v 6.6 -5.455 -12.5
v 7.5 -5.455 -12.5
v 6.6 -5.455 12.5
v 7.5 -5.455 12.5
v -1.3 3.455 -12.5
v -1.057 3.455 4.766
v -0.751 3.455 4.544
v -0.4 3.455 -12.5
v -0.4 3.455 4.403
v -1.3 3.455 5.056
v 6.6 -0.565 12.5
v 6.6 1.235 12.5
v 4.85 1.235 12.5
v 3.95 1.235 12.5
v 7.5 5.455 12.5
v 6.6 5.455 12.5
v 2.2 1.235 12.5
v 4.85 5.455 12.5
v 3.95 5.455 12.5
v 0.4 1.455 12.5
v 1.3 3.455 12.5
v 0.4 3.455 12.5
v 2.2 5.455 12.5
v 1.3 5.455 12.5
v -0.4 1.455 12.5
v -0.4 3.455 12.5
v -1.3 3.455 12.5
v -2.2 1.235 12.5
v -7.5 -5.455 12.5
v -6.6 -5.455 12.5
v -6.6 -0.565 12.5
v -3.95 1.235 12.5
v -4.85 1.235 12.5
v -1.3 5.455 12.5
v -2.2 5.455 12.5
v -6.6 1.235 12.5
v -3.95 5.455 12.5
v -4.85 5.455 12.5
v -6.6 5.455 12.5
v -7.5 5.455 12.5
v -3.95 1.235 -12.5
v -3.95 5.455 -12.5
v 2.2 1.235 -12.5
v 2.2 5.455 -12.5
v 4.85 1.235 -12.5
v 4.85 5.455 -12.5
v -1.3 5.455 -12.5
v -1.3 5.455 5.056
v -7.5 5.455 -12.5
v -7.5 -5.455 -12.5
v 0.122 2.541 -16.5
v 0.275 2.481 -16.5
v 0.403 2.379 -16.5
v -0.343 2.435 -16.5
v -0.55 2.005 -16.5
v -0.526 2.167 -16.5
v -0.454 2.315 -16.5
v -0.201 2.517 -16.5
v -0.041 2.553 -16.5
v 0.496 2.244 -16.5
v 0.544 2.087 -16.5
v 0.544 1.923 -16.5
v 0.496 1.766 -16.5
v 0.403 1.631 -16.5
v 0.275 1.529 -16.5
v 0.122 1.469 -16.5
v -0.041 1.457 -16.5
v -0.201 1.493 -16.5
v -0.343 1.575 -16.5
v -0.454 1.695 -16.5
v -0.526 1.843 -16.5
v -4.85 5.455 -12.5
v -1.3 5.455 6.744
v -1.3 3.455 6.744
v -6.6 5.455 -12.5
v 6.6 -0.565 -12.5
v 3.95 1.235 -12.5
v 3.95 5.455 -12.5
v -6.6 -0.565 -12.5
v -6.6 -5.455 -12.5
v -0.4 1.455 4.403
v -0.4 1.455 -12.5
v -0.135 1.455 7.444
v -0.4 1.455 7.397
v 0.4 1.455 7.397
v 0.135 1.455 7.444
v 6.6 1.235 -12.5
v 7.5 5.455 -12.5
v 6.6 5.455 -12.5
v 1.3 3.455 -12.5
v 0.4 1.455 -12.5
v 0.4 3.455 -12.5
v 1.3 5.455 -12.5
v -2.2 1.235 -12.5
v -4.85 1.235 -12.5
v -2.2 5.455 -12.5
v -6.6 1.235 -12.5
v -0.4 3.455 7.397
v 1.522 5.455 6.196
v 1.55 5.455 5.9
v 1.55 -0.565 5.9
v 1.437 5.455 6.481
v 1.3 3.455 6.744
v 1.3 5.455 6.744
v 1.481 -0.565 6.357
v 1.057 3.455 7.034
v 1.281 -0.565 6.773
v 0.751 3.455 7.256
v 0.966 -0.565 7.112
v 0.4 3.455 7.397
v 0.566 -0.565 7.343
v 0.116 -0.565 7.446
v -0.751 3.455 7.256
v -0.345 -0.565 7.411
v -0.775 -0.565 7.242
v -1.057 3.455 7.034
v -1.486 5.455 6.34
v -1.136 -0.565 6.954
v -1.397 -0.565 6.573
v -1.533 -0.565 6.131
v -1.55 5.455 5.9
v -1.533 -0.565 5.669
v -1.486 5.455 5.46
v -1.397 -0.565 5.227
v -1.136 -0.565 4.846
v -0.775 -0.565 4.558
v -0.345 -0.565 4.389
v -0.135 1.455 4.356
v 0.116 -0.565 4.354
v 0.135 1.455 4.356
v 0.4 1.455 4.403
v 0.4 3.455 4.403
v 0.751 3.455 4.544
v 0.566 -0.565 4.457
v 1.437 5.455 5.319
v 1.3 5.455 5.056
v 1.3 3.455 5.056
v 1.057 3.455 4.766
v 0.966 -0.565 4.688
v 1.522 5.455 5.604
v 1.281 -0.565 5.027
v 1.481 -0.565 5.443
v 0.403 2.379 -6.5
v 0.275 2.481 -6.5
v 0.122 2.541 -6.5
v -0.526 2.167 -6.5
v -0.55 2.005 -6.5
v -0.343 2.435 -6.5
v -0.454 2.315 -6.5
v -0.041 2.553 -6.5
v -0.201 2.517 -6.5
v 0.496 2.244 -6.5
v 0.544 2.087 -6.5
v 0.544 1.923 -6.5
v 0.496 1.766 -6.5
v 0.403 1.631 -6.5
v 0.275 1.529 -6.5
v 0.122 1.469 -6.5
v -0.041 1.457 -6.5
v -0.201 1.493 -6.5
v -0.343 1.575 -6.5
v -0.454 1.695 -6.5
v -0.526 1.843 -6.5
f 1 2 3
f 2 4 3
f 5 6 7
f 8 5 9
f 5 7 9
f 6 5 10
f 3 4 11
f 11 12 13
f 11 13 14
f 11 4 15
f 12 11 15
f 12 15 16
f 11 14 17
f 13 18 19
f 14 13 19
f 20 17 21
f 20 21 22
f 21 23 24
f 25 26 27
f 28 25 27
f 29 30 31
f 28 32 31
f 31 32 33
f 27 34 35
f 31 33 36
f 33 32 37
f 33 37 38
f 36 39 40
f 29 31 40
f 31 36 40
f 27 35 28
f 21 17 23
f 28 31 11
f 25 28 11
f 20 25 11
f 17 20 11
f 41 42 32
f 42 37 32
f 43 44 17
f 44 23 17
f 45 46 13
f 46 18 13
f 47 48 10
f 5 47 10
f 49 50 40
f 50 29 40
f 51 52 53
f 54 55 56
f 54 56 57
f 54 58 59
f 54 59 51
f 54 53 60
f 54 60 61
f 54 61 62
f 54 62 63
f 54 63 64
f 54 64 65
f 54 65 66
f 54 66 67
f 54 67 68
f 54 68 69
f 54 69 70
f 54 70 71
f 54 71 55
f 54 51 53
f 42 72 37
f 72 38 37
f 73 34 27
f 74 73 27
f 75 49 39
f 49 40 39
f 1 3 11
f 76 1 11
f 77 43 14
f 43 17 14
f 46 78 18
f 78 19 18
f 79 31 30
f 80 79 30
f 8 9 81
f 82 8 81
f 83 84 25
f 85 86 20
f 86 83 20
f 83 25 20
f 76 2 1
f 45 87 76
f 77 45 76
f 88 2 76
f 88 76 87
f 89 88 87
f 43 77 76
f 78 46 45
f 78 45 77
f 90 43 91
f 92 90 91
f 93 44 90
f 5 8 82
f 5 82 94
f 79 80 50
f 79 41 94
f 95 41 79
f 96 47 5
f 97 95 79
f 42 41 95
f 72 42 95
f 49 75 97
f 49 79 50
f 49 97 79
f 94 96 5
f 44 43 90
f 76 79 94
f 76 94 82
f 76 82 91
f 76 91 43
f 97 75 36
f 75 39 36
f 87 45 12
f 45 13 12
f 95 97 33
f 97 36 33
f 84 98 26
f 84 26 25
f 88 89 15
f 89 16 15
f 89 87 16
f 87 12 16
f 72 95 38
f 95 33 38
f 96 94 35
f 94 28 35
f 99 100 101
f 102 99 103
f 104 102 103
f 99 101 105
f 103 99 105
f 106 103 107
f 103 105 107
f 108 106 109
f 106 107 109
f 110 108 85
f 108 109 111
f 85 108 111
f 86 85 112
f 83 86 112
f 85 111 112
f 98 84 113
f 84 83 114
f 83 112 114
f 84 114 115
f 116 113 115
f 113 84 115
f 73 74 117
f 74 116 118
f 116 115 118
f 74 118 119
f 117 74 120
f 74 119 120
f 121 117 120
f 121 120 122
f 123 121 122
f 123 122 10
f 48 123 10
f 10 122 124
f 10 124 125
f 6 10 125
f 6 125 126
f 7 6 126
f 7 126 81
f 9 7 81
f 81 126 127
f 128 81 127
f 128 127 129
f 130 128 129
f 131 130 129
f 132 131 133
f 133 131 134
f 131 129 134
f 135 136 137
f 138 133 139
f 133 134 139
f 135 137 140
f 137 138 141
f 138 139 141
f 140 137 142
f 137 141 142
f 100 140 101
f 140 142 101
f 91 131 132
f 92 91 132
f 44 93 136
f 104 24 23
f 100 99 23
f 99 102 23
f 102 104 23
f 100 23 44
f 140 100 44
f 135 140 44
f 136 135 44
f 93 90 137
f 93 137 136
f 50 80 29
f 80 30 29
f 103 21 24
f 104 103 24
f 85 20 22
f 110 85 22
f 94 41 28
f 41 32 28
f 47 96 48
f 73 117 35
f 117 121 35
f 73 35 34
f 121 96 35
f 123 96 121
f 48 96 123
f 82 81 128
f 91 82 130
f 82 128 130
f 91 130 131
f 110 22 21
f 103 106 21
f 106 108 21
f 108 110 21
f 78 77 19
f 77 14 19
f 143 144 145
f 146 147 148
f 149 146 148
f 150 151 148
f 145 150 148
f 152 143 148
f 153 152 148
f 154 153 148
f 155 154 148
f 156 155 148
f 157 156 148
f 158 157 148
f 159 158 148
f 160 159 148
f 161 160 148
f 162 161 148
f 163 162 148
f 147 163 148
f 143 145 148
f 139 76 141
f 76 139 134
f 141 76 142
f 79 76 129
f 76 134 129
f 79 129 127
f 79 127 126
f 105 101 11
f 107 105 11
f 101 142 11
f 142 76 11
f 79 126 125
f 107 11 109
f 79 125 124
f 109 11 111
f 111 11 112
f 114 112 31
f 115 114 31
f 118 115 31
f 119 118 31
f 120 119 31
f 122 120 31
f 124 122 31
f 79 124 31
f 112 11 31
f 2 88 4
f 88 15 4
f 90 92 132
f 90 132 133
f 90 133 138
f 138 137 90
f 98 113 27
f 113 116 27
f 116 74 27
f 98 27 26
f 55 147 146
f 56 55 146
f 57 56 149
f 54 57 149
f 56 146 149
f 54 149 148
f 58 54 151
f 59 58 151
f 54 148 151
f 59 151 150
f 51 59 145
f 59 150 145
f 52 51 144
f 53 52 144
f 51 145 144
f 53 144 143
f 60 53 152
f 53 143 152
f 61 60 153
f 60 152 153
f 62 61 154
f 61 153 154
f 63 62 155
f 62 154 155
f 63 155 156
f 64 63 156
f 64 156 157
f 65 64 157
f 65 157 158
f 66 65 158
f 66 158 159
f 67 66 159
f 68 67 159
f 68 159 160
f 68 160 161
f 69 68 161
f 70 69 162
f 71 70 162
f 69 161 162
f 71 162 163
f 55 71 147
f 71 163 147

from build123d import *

# Parameters (mm, degrees)
BOSS_EXTRUDE1_DEPTH      = 12.5
SKETCH3_R                = 1.55
CUT_EXTRUDE1_DEPTH       = 25
BOSS_EXTRUDE4_DEPTH      = 4
BOSS_EXTRUDE4_DEPTH_BACK = 6
SKETCH4_R                = 0.55


with BuildPart() as part:
    # Sketch2 → Boss-Extrude1 (new, symmetric)
    with BuildSketch(Plane.XY):
        Polygon((-6.6, -0.565), (-6.6, -5.455), (-7.5, -5.455), (-7.5, 5.455), (-6.6, 5.455), (-6.6, 1.235), (-4.85, 1.235), (-4.85, 5.455), (-3.95, 5.455), (-3.95, 1.235), (-2.2, 1.235), (-2.2, 5.455), (-1.3, 5.455), (-1.3, 3.455), (-0.4, 3.455), (-0.4, 1.455), (0.4, 1.455), (0.4, 3.455), (1.3, 3.455), (1.3, 5.455), (2.2, 5.455), (2.2, 1.235), (3.95, 1.235), (3.95, 5.455), (4.85, 5.455), (4.85, 1.235), (6.6, 1.235), (6.6, 5.455), (7.5, 5.455), (7.5, -5.455), (6.6, -5.455), (6.6, -0.565), align=None)
    extrude(amount=BOSS_EXTRUDE1_DEPTH, both=True)

    # Sketch3 → Cut-Extrude1 (cut)
    with BuildSketch(Plane.XZ.offset(0.565)):
        with Locations((0, 5.9)):
            Circle(SKETCH3_R)
    extrude(amount=-CUT_EXTRUDE1_DEPTH, mode=Mode.SUBTRACT)


with BuildPart() as body_2:
    # Sketch4 → Boss-Extrude4 (new, two sides: drawn at the far end of the back side and taken through both)
    with BuildSketch(Plane(origin=(0, 0, -12.5), x_dir=(-1, 0, 0), z_dir=(0, 0, -1)).offset(-BOSS_EXTRUDE4_DEPTH_BACK)):
        with Locations((0, 2.005)):
            Circle(SKETCH4_R)
    extrude(amount=BOSS_EXTRUDE4_DEPTH + BOSS_EXTRUDE4_DEPTH_BACK)


solid = Compound([part.part, body_2.part])
